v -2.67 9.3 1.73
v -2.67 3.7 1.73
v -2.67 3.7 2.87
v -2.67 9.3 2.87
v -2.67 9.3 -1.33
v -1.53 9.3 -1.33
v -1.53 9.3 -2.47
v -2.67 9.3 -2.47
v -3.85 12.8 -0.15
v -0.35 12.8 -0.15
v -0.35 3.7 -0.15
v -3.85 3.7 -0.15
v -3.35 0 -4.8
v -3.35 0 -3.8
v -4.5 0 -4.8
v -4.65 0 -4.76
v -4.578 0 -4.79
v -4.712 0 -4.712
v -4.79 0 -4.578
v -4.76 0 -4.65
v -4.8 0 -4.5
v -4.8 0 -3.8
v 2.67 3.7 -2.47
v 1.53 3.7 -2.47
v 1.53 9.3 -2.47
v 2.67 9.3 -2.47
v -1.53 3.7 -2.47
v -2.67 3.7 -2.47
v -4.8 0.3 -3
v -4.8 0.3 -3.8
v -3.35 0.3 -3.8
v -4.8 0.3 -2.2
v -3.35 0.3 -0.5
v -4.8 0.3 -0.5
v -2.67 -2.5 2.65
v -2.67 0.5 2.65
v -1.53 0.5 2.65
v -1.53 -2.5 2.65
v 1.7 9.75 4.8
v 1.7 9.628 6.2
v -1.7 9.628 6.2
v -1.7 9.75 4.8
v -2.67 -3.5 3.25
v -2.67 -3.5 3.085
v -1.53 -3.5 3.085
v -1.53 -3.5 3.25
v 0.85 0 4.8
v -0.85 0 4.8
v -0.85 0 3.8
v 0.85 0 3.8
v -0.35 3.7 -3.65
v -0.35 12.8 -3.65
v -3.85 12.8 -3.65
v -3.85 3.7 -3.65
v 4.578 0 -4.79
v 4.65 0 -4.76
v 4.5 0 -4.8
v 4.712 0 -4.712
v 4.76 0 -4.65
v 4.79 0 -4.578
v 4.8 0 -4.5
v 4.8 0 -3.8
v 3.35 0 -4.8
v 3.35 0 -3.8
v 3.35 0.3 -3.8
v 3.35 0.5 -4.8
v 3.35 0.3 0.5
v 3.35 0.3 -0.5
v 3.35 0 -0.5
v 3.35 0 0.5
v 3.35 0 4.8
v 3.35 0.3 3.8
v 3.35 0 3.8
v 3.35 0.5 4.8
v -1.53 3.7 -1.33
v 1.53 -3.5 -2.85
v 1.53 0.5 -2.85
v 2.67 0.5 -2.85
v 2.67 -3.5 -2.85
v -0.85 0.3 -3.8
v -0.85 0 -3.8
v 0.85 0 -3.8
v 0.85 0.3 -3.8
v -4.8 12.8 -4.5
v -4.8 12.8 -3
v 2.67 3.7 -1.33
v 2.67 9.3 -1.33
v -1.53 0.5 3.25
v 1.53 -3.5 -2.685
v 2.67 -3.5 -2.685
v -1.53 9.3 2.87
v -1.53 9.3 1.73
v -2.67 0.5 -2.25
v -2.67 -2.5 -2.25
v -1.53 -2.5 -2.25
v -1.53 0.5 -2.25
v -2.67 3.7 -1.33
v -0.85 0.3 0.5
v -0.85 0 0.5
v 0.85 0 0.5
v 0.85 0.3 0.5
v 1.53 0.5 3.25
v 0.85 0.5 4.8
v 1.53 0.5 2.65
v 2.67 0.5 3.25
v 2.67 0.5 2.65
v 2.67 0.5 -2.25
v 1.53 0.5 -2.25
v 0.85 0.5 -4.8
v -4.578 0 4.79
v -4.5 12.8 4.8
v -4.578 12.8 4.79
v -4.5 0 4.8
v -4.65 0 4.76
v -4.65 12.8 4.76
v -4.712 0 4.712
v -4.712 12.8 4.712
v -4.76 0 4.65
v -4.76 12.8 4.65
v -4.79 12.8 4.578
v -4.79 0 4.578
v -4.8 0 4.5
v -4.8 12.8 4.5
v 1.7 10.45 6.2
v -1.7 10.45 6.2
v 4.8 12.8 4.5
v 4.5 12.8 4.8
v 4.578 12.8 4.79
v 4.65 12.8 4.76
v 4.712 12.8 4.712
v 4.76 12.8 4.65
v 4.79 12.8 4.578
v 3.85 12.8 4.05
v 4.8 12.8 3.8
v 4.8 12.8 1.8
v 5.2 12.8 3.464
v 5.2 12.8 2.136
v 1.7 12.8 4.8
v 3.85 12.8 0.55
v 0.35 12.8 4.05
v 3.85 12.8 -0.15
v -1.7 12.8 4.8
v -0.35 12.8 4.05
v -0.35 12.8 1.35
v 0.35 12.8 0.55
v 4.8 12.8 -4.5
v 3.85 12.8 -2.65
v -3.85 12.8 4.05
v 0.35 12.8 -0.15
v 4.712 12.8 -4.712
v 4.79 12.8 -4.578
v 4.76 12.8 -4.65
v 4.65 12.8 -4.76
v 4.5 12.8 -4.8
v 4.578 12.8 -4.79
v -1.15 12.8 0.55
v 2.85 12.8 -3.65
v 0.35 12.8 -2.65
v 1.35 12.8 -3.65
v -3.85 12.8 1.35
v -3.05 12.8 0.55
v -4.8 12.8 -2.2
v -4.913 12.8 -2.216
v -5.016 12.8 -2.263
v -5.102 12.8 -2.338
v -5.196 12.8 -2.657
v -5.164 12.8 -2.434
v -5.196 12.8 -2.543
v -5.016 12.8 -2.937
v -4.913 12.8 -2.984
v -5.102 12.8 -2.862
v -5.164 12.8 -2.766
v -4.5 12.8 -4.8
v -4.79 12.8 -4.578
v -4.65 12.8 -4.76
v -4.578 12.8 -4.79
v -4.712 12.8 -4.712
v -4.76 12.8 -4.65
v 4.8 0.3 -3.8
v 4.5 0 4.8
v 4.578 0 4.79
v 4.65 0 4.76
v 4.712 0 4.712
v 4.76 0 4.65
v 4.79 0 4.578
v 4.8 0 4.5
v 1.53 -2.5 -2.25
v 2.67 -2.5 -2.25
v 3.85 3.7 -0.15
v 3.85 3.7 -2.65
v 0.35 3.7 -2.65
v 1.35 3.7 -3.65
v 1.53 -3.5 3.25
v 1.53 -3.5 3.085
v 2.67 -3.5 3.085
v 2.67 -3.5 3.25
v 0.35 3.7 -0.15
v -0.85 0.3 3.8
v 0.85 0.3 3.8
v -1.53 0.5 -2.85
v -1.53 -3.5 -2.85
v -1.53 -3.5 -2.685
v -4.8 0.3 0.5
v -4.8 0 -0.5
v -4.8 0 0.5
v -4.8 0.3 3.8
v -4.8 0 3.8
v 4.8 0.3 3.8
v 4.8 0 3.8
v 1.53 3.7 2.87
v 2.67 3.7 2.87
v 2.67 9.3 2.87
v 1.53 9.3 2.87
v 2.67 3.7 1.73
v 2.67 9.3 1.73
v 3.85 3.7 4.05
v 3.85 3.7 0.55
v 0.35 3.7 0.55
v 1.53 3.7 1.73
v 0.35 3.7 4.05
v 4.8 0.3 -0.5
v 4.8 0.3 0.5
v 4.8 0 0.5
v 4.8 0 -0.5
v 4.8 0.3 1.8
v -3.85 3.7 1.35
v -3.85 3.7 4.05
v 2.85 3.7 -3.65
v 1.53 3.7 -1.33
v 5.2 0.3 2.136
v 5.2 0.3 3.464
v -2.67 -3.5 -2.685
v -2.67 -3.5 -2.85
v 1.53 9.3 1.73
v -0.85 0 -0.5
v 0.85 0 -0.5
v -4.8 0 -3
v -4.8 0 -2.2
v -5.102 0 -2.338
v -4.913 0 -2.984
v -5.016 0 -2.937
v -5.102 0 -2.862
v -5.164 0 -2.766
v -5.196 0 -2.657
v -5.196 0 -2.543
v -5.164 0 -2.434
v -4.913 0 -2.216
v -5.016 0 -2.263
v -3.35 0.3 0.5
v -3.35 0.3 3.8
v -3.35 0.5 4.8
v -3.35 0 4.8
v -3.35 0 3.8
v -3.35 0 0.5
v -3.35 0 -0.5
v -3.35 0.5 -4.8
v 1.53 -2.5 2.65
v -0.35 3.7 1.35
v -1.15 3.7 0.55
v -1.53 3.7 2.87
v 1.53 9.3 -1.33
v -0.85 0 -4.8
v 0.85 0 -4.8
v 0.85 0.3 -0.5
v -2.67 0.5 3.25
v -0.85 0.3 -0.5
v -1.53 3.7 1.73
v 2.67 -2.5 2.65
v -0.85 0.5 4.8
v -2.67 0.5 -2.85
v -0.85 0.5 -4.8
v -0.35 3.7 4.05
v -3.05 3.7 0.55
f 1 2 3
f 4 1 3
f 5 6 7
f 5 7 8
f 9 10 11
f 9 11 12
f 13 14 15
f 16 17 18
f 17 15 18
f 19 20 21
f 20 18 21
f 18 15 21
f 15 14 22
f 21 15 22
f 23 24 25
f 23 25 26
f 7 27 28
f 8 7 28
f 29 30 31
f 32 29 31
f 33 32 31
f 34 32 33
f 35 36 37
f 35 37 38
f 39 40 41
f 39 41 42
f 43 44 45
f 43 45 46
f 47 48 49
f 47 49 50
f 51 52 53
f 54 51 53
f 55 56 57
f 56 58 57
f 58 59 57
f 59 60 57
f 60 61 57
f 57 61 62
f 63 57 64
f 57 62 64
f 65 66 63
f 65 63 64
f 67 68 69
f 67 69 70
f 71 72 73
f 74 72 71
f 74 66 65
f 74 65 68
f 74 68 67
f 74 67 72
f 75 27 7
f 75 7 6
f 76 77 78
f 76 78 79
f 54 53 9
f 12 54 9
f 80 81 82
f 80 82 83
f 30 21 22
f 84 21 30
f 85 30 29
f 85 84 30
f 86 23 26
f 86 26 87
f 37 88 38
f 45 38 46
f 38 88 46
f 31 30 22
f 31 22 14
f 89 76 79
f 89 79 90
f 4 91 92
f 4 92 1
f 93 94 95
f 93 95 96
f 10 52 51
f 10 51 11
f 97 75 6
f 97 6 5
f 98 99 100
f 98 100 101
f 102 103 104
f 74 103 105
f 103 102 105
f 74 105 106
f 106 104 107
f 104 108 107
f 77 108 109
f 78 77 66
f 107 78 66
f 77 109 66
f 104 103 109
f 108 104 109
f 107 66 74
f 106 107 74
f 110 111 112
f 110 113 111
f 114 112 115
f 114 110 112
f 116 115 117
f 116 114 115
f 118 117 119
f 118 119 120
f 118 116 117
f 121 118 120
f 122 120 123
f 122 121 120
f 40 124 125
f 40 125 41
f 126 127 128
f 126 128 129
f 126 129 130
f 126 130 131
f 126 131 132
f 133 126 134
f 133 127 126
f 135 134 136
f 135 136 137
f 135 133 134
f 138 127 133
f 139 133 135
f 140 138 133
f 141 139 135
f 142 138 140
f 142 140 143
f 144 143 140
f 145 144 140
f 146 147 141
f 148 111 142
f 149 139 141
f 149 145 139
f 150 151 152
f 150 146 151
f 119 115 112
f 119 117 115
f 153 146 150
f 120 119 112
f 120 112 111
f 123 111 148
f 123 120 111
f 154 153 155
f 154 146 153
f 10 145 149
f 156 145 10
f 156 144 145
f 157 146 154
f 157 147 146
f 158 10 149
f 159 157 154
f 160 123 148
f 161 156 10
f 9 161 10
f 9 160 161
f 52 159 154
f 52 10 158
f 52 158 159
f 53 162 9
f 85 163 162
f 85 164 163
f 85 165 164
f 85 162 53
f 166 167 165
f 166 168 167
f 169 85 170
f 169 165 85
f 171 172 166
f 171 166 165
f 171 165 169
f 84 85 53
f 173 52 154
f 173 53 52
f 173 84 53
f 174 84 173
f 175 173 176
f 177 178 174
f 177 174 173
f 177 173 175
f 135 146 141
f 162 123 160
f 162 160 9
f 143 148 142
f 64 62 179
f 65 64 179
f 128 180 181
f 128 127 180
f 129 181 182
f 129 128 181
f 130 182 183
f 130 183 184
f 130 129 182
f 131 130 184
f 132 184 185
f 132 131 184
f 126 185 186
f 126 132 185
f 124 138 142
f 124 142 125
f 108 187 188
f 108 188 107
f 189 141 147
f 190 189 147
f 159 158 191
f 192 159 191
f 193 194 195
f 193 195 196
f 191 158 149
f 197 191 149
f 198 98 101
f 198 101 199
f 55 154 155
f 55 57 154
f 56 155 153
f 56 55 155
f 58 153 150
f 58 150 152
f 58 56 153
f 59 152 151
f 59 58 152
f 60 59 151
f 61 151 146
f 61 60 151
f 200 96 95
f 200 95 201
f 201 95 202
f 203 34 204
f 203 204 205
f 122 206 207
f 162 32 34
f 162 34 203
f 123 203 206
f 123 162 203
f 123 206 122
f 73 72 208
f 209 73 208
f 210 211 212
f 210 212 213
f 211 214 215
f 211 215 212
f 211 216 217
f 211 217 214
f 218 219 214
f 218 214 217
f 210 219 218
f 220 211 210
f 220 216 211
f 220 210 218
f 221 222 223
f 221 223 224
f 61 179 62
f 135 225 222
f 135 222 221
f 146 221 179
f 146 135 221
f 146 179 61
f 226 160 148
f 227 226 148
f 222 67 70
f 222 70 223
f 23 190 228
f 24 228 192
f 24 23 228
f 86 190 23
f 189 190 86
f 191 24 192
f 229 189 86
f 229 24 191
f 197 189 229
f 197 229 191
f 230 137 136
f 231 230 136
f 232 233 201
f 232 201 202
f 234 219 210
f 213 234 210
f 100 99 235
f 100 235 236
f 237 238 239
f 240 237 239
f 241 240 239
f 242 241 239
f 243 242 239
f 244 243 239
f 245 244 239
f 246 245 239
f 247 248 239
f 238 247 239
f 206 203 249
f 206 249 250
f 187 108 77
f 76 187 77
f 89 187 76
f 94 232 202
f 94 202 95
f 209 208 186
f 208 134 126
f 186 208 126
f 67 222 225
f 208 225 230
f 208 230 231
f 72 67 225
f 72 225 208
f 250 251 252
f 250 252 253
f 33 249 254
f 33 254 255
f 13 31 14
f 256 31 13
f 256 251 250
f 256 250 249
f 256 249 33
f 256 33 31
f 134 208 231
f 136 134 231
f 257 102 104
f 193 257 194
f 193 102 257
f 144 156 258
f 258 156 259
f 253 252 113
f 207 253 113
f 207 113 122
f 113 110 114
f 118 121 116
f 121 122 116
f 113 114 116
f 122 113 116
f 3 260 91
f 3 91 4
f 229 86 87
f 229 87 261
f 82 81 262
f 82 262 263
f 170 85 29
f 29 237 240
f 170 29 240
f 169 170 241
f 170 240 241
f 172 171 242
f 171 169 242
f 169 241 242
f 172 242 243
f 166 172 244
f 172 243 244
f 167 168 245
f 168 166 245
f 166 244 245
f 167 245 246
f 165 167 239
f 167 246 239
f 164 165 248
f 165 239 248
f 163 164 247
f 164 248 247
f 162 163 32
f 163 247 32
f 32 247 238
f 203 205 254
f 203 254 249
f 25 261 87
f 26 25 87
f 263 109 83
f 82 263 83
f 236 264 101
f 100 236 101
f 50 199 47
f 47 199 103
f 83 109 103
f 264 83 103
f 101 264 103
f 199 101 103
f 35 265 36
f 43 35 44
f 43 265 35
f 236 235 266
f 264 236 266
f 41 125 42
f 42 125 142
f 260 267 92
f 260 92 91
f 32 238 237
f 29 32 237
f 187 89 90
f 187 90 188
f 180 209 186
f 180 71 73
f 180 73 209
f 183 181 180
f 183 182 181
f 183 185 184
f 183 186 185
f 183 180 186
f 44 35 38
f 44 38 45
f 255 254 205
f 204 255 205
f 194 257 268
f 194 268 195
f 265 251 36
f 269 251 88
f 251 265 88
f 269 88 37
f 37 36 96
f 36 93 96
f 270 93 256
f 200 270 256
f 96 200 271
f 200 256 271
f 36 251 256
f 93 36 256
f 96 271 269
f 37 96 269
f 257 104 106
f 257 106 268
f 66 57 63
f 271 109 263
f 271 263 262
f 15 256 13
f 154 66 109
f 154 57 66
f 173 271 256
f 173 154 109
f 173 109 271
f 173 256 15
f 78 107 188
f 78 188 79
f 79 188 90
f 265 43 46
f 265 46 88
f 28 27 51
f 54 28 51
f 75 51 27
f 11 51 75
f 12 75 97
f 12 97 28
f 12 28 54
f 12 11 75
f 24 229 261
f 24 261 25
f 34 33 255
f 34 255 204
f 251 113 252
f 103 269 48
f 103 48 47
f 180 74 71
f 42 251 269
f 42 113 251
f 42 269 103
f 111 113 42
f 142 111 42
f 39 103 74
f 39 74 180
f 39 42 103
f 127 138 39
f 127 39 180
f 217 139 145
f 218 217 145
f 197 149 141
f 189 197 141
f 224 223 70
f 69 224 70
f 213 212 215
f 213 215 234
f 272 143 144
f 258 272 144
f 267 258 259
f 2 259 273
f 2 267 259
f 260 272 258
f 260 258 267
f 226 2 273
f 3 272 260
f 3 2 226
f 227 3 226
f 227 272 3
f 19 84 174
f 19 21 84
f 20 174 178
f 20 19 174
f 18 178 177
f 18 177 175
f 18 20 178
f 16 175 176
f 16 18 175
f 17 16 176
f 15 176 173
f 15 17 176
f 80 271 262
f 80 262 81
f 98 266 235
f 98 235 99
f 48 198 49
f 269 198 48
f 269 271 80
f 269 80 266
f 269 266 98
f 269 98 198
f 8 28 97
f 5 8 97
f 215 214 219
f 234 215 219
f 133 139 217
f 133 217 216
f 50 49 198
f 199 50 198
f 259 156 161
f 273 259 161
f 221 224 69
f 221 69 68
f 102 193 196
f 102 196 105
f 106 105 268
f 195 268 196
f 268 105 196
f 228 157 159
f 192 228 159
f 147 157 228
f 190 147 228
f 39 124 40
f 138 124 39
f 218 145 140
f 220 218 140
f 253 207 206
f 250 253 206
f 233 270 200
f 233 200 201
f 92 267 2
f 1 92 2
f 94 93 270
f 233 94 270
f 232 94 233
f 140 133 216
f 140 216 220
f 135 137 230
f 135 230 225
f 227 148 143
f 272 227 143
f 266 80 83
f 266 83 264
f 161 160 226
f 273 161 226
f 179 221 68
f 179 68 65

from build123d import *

# Parameters (mm, degrees)
BOSS_EXTRUDE1_DEPTH  = 12.5
BOSS_EXTRUDE2_DEPTH  = 3.4
BOSS_EXTRUDE3_DEPTH  = 3.5000000000000004
SKETCH4_W            = 0.40000000000000124
SKETCH4_H            = 6.935639852470931
CUT_EXTRUDE1_DEPTH   = 15.890601062415177
CUT_EXTRUDE2_DEPTH   = 18.660124574872064
BOSS_EXTRUDE4_DEPTH  = 0.29999999999999993
SKETCH7_W            = 1.7000000000000002
SKETCH7_H            = 9.6
BOSS_EXTRUDE5_DEPTH  = 0.5000000000000003
BOSS_EXTRUDE6_DEPTH  = 0.3
CUT_EXTRUDE3_DEPTH   = 15.890601062415183
SKETCH10_W           = 1.4499999999999997
SKETCH10_H           = 1
BOSS_EXTRUDE7_DEPTH  = 0.3
BOSS_EXTRUDE8_DEPTH  = 0.3
BOSS_EXTRUDE9_START  = 0.3
BOSS_EXTRUDE9_DEPTH  = 0.3
SKETCH13_W           = 3.3000000000000003
SKETCH13_H           = 0.3
CUT_EXTRUDE4_DEPTH   = 16.455824144962317
SKETCH14_W           = 3.3
SKETCH14_H           = 0.3
CUT_EXTRUDE5_DEPTH   = 1.7
SKETCH15_W           = 3.3
SKETCH15_H           = 0.3
CUT_EXTRUDE6_DEPTH   = 18.38620142526826
CUT_EXTRUDE7_REACH   = 19.386
SKETCH16_W           = 3.3
SKETCH16_H           = 0.3
BOSS_EXTRUDE10_DEPTH = 1.14
BOSS_EXTRUDE11_DEPTH = 1.14
BOSS_EXTRUDE12_DEPTH = 1.14
BOSS_EXTRUDE13_DEPTH = 1.14
CUT_EXTRUDE8_DEPTH   = 9.1
SKETCH22_W           = 1.1399999999999995
SKETCH22_H           = 1.1400000000000003
BOSS_EXTRUDE14_DEPTH = 5.6000000000000005
SKETCH23_W           = 3.5
SKETCH23_H           = 3.4999999999999996
CUT_EXTRUDE9_DEPTH   = 9.1
SKETCH24_W           = 1.14
SKETCH24_H           = 1.1400000000000003
BOSS_EXTRUDE15_DEPTH = 5.6000000000000005
CUT_EXTRUDE10_DEPTH  = 9.1
BOSS_EXTRUDE16_DEPTH = 5.6000000000000005
SKETCH27_W           = 3.5
SKETCH27_H           = 3.4999999999999996
CUT_EXTRUDE11_DEPTH  = 9.1
SKETCH28_W           = 1.1399999999999995
SKETCH28_H           = 1.1400000000000006
BOSS_EXTRUDE17_DEPTH = 5.6000000000000005
DRAFT1_ANGLE         = -5.000000000000134
DRAFT2_ANGLE         = 39.99999999999766
CHAMFER1_SIZE        = 1.0000000000000708
CHAMFER2_SIZE        = 0.7999999999999999
FILLET1_R            = 0.3


with BuildPart() as part:
    # Sketch1 → Boss-Extrude1 (new body)
    with BuildSketch(Plane.XZ.offset(-0.3)):
        with BuildLine():
            Line((-4.8, -4.8), (1.7000000000000002, -4.8))
            Line((1.7000000000000002, -4.8), (1.7000000000000002, 4.800000000000001))
            Line((1.7000000000000002, 4.800000000000001), (-4.8, 4.8))
            Line((-4.8, 4.8), (-4.8, -2.2))
            ThreePointArc((-4.8, -2.2), (-5.2, -2.6000000000000005), (-4.8, -3.0000000000000004))
            Line((-4.8, -3.0000000000000004), (-4.8, -4.8))
        make_face()
    extrude(amount=-BOSS_EXTRUDE1_DEPTH)

    # Sketch2 → Boss-Extrude2 (add)
    with BuildSketch(Plane(origin=(1.7, 0, 0), x_dir=(0, 0, -1), z_dir=(1, 0, 0))):
        Polygon((-4.800000000000008, 12.800000000000006), (-6.200000000000001, 10.45), (-6.200000000000001, 9.627515871063899), (-4.800000000000008, 9.627515871063899), align=None)
    extrude(amount=-BOSS_EXTRUDE2_DEPTH)

    # Sketch3 → Boss-Extrude3 (add)
    with BuildSketch(Plane(origin=(1.7000000000000002, 0, 0), x_dir=(0, 0, -1), z_dir=(1, 0, 0))):
        Polygon((4.8, 0.29999999999999993), (-4.800000000000001, 0.29999999999999993), (-4.8, 12.8), (4.8, 12.8), align=None)
    extrude(amount=BOSS_EXTRUDE3_DEPTH)

    # Sketch4 → Cut-Extrude1 (cut, through all)
    with BuildSketch(Plane(origin=(0, 12.8, 0), x_dir=(-1, 0, 0), z_dir=(0, 1, 0))):
        with Locations((-5, -1.3321800737645344)):
            Rectangle(SKETCH4_W, SKETCH4_H)
    extrude(amount=-CUT_EXTRUDE1_DEPTH, mode=Mode.SUBTRACT)

    # Sketch5 → Cut-Extrude2 (cut, through all)
    with BuildSketch(Plane(origin=(0, 0, -4.8), x_dir=(-1, 0, 0), z_dir=(0, 0, -1))):
        Polygon((-3.35, 0.29999999999999993), (3.3499999999999996, 0.29999999999999993), (3.35, 0.5000000000000001), (-3.35, 0.5000000000000004), align=None)
    extrude(amount=-CUT_EXTRUDE2_DEPTH, mode=Mode.SUBTRACT)

    # Sketch6 → Boss-Extrude4 (add)
    with BuildSketch(Plane.XZ.offset(-0.3)):
        Polygon((4.8, -4.8), (3.35, -4.8), (3.35, 0.49999999999999956), (4.8, 0.5), align=None)
    extrude(amount=BOSS_EXTRUDE4_DEPTH)

    # Sketch7 → Boss-Extrude5 (add)
    with BuildSketch(Plane.XZ.offset(-0.5000000000000002)):
        Rectangle(SKETCH7_W, SKETCH7_H)
    extrude(amount=BOSS_EXTRUDE5_DEPTH)

    # Sketch8 → Boss-Extrude6 (add)
    with BuildSketch(Plane.XZ.offset(-0.3)):
        Polygon((-4.8, -4.8), (-4.8, -3.8), (-3.3499999999999996, -3.8), (-3.35, -4.8), align=None)
    extrude(amount=BOSS_EXTRUDE6_DEPTH)

    # Sketch9 → Cut-Extrude3 (cut, through all)
    with BuildSketch(Plane.XZ.offset(-0.3)):
        Polygon((5.200000000000001, 4.800000000000001), (4.8, 4.800000000000001), (4.8, 3.464360147529), (5.200000000000001, 3.4643601475289993), align=None)
    extrude(amount=-CUT_EXTRUDE3_DEPTH, mode=Mode.SUBTRACT)

    # Sketch10 → Boss-Extrude7 (add)
    with BuildSketch(Plane.XZ.offset(-0.3)):
        with Locations((4.075, 4.3)):
            Rectangle(SKETCH10_W, SKETCH10_H)
    extrude(amount=BOSS_EXTRUDE7_DEPTH)

    # Sketch11 → Boss-Extrude8 (add)
    with BuildSketch(Plane.XZ.offset(-0.3)):
        Polygon((-4.8, 4.8), (-3.3499999999999996, 4.8), (-3.35, -0.49999999999999956), (-4.8, -0.5), align=None)
    extrude(amount=BOSS_EXTRUDE8_DEPTH)

    # Sketch12 → Boss-Extrude9 (add)
    with BuildSketch(Plane.XZ.offset(-0.3).offset(BOSS_EXTRUDE9_START)):
        with BuildLine():
            Line((-4.8, -2.2), (-4.8, -3.0000000000000004))
            ThreePointArc((-4.8, -3.0000000000000004), (-5.199999999999999, -2.6000000000000005), (-4.8, -2.2))
        make_face()
    extrude(amount=-BOSS_EXTRUDE9_DEPTH)

    # Sketch13 → Cut-Extrude4 (cut, through all)
    with BuildSketch(Plane.ZY.offset(0.8500000000000001)):
        with Locations((2.15, 0.15000000000000005)):
            Rectangle(SKETCH13_W, SKETCH13_H)
    extrude(amount=-CUT_EXTRUDE4_DEPTH, mode=Mode.SUBTRACT)

    # Sketch14 → Cut-Extrude5 (cut)
    with BuildSketch(Plane.ZY.offset(0.8500000000000001)):
        with Locations((-2.15, 0.15000000000000005)):
            Rectangle(SKETCH14_W, SKETCH14_H)
    extrude(amount=-CUT_EXTRUDE5_DEPTH, mode=Mode.SUBTRACT)

    # Sketch15 → Cut-Extrude6 (cut, through all)
    with BuildSketch(Plane.ZY.offset(4.8)):
        with Locations((2.15, 0.15)):
            Rectangle(SKETCH15_W, SKETCH15_H)
    extrude(amount=-CUT_EXTRUDE6_DEPTH, mode=Mode.SUBTRACT)

    # Sketch16 → Cut-Extrude7 (cut, up to next)
    with BuildSketch(Plane(origin=(4.8, 0, 0), x_dir=(0, 0, -1), z_dir=(1, 0, 0)), mode=Mode.PRIVATE) as cut_extrude7_sk1:
        with Locations((2.15, 0.15)):
            Rectangle(SKETCH16_W, SKETCH16_H)
    cut_extrude7_tool1 = extrude(cut_extrude7_sk1.sketch, amount=-CUT_EXTRUDE7_REACH, mode=Mode.PRIVATE) & part.part
    add(cut_extrude7_tool1.solids().sort_by_distance((4.8, 0.15, -2.15))[0], mode=Mode.SUBTRACT)

    # Sketch17 → Boss-Extrude10 (add)
    with BuildSketch(Plane(origin=(1.53, 0, 0), x_dir=(0, -1, 0), z_dir=(-1, 0, 0))):
        Polygon((2.500000000000003, 2.6499999999999937), (3.5, 3.085), (3.5, 3.2500000000000004), (-0.5, 3.2500000000000004), (-0.5, 2.6500000000000004), align=None)
    extrude(amount=-BOSS_EXTRUDE10_DEPTH)

    # Sketch18 → Boss-Extrude11 (add)
    with BuildSketch(Plane(origin=(1.53, 0, 0), x_dir=(0, -1, 0), z_dir=(-1, 0, 0))):
        Polygon((3.5, -2.85), (3.4999999999999987, -2.685000000000003), (2.5000000000000004, -2.2500000000000004), (-0.5, -2.2500000000000004), (-0.5, -2.85), align=None)
    extrude(amount=-BOSS_EXTRUDE11_DEPTH)

    # Sketch19 → Boss-Extrude12 (add)
    with BuildSketch(Plane(origin=(-2.6700000000000004, 0, 0), x_dir=(0, -1, 0), z_dir=(-1, 0, 0))):
        Polygon((2.500000000000003, 2.6499999999999937), (3.5, 3.085), (3.5, 3.2500000000000004), (-0.5, 3.2500000000000004), (-0.5, 2.6500000000000004), align=None)
    extrude(amount=-BOSS_EXTRUDE12_DEPTH)

    # Sketch20 → Boss-Extrude13 (add)
    with BuildSketch(Plane(origin=(-2.6700000000000004, 0, 0), x_dir=(0, -1, 0), z_dir=(-1, 0, 0))):
        Polygon((3.5, -2.85), (3.4999999999999987, -2.685000000000003), (2.5000000000000004, -2.2500000000000004), (-0.5, -2.2500000000000004), (-0.5, -2.85), align=None)
    extrude(amount=-BOSS_EXTRUDE13_DEPTH)

    # Sketch21 → Cut-Extrude8 (cut)
    with BuildSketch(Plane(origin=(0, 12.8, 0), x_dir=(-1, 0, 0), z_dir=(0, 1, 0))):
        Polygon((0.3499999999999999, 4.05), (0.34999999999999964, 0.5500000000000002), (3.85, 0.5500000000000002), (3.85, 4.05), align=None)
    extrude(amount=-CUT_EXTRUDE8_DEPTH, mode=Mode.SUBTRACT)

    # Sketch22 → Boss-Extrude14 (add)
    with BuildSketch(Plane(origin=(0, 3.7, 0), x_dir=(-1, 0, 0), z_dir=(0, 1, 0))):
        with Locations((2.0999999999999996, 2.3)):
            Rectangle(SKETCH22_W, SKETCH22_H)
    extrude(amount=BOSS_EXTRUDE14_DEPTH)

    # Sketch23 → Cut-Extrude9 (cut)
    with BuildSketch(Plane(origin=(0, 12.8, 0), x_dir=(-1, 0, 0), z_dir=(0, 1, 0))):
        with Locations((-2.1, 2.3)):
            Rectangle(SKETCH23_W, SKETCH23_H)
    extrude(amount=-CUT_EXTRUDE9_DEPTH, mode=Mode.SUBTRACT)

    # Sketch24 → Boss-Extrude15 (add)
    with BuildSketch(Plane(origin=(0, 3.7, 0), x_dir=(-1, 0, 0), z_dir=(0, 1, 0))):
        with Locations((-2.1, 2.3)):
            Rectangle(SKETCH24_W, SKETCH24_H)
    extrude(amount=BOSS_EXTRUDE15_DEPTH)

    # Sketch25 → Cut-Extrude10 (cut)
    with BuildSketch(Plane(origin=(0, 12.8, 0), x_dir=(-1, 0, 0), z_dir=(0, 1, 0))):
        Polygon((-3.85, -0.14999999999999997), (-3.85, -3.6499999999999995), (-0.3499999999999998, -3.6499999999999995), (-0.3499999999999999, -0.14999999999999997), align=None)
    extrude(amount=-CUT_EXTRUDE10_DEPTH, mode=Mode.SUBTRACT)

    # Sketch26 → Boss-Extrude16 (add)
    with BuildSketch(Plane(origin=(0, 3.7, 0), x_dir=(-1, 0, 0), z_dir=(0, 1, 0))):
        Polygon((-2.67, -2.4700000000000006), (-2.67, -1.3300000000000003), (-1.53, -1.33), (-1.53, -2.4700000000000006), align=None)
    extrude(amount=BOSS_EXTRUDE16_DEPTH)

    # Sketch27 → Cut-Extrude11 (cut)
    with BuildSketch(Plane(origin=(0, 12.8, 0), x_dir=(-1, 0, 0), z_dir=(0, 1, 0))):
        with Locations((2.1, -1.8999999999999997)):
            Rectangle(SKETCH27_W, SKETCH27_H)
    extrude(amount=-CUT_EXTRUDE11_DEPTH, mode=Mode.SUBTRACT)

    # Sketch28 → Boss-Extrude17 (add)
    with BuildSketch(Plane(origin=(0, 3.7, 0), x_dir=(-1, 0, 0), z_dir=(0, 1, 0))):
        with Locations((2.0999999999999996, -1.9000000000000004)):
            Rectangle(SKETCH28_W, SKETCH28_H)
    extrude(amount=BOSS_EXTRUDE17_DEPTH)

    # Draft1
    draft1_faces = [part.faces().sort_by_distance(p)[0] for p in [
        (-5e-17, 9.627515871063899, 5.500000000000004),
    ]]
    draft(draft1_faces, Plane(origin=(-1.7, 10.45, 6.200000000000001), x_dir=(1, 0, 0), z_dir=(0, 0, 1)), DRAFT1_ANGLE)

    # Draft2
    draft2_faces = [part.faces().sort_by_distance(p)[0] for p in [
        (5.000000000000001, 6.550000000000001, 3.4643601475290002),
        (5.000000000000001, 6.550000000000001, 2.135639852470931),
    ]]
    draft(draft2_faces, Plane(origin=(5.200000000000001, 0, 0), x_dir=(0, 0, 1), z_dir=(1, 0, 0)), DRAFT2_ANGLE)

    # Chamfer1
    chamfer1_edges = [part.edges().sort_by_distance(p)[0] for p in [
        (0.3499999999999998, 8.25, -3.6499999999999995),
        (3.85, 8.25, -3.6499999999999995),
    ]]
    chamfer(chamfer1_edges, length=CHAMFER1_SIZE)

    # Chamfer2
    chamfer2_edges = [part.edges().sort_by_distance(p)[0] for p in [
        (-3.85, 8.25, 0.5500000000000002),
        (-0.34999999999999964, 8.25, 0.5500000000000002),
    ]]
    chamfer(chamfer2_edges, length=CHAMFER2_SIZE)

    # Fillet1
    fillet1_edges = [part.edges().sort_by_distance(p)[0] for p in [
        (-4.8, 6.4, 4.8),
        (-4.8, 6.4, -4.8),
        (4.8, 6.4, 4.800000000000001),
        (4.8, 6.4, -4.8),
    ]]
    fillet(fillet1_edges, radius=FILLET1_R)


solid = part.part
